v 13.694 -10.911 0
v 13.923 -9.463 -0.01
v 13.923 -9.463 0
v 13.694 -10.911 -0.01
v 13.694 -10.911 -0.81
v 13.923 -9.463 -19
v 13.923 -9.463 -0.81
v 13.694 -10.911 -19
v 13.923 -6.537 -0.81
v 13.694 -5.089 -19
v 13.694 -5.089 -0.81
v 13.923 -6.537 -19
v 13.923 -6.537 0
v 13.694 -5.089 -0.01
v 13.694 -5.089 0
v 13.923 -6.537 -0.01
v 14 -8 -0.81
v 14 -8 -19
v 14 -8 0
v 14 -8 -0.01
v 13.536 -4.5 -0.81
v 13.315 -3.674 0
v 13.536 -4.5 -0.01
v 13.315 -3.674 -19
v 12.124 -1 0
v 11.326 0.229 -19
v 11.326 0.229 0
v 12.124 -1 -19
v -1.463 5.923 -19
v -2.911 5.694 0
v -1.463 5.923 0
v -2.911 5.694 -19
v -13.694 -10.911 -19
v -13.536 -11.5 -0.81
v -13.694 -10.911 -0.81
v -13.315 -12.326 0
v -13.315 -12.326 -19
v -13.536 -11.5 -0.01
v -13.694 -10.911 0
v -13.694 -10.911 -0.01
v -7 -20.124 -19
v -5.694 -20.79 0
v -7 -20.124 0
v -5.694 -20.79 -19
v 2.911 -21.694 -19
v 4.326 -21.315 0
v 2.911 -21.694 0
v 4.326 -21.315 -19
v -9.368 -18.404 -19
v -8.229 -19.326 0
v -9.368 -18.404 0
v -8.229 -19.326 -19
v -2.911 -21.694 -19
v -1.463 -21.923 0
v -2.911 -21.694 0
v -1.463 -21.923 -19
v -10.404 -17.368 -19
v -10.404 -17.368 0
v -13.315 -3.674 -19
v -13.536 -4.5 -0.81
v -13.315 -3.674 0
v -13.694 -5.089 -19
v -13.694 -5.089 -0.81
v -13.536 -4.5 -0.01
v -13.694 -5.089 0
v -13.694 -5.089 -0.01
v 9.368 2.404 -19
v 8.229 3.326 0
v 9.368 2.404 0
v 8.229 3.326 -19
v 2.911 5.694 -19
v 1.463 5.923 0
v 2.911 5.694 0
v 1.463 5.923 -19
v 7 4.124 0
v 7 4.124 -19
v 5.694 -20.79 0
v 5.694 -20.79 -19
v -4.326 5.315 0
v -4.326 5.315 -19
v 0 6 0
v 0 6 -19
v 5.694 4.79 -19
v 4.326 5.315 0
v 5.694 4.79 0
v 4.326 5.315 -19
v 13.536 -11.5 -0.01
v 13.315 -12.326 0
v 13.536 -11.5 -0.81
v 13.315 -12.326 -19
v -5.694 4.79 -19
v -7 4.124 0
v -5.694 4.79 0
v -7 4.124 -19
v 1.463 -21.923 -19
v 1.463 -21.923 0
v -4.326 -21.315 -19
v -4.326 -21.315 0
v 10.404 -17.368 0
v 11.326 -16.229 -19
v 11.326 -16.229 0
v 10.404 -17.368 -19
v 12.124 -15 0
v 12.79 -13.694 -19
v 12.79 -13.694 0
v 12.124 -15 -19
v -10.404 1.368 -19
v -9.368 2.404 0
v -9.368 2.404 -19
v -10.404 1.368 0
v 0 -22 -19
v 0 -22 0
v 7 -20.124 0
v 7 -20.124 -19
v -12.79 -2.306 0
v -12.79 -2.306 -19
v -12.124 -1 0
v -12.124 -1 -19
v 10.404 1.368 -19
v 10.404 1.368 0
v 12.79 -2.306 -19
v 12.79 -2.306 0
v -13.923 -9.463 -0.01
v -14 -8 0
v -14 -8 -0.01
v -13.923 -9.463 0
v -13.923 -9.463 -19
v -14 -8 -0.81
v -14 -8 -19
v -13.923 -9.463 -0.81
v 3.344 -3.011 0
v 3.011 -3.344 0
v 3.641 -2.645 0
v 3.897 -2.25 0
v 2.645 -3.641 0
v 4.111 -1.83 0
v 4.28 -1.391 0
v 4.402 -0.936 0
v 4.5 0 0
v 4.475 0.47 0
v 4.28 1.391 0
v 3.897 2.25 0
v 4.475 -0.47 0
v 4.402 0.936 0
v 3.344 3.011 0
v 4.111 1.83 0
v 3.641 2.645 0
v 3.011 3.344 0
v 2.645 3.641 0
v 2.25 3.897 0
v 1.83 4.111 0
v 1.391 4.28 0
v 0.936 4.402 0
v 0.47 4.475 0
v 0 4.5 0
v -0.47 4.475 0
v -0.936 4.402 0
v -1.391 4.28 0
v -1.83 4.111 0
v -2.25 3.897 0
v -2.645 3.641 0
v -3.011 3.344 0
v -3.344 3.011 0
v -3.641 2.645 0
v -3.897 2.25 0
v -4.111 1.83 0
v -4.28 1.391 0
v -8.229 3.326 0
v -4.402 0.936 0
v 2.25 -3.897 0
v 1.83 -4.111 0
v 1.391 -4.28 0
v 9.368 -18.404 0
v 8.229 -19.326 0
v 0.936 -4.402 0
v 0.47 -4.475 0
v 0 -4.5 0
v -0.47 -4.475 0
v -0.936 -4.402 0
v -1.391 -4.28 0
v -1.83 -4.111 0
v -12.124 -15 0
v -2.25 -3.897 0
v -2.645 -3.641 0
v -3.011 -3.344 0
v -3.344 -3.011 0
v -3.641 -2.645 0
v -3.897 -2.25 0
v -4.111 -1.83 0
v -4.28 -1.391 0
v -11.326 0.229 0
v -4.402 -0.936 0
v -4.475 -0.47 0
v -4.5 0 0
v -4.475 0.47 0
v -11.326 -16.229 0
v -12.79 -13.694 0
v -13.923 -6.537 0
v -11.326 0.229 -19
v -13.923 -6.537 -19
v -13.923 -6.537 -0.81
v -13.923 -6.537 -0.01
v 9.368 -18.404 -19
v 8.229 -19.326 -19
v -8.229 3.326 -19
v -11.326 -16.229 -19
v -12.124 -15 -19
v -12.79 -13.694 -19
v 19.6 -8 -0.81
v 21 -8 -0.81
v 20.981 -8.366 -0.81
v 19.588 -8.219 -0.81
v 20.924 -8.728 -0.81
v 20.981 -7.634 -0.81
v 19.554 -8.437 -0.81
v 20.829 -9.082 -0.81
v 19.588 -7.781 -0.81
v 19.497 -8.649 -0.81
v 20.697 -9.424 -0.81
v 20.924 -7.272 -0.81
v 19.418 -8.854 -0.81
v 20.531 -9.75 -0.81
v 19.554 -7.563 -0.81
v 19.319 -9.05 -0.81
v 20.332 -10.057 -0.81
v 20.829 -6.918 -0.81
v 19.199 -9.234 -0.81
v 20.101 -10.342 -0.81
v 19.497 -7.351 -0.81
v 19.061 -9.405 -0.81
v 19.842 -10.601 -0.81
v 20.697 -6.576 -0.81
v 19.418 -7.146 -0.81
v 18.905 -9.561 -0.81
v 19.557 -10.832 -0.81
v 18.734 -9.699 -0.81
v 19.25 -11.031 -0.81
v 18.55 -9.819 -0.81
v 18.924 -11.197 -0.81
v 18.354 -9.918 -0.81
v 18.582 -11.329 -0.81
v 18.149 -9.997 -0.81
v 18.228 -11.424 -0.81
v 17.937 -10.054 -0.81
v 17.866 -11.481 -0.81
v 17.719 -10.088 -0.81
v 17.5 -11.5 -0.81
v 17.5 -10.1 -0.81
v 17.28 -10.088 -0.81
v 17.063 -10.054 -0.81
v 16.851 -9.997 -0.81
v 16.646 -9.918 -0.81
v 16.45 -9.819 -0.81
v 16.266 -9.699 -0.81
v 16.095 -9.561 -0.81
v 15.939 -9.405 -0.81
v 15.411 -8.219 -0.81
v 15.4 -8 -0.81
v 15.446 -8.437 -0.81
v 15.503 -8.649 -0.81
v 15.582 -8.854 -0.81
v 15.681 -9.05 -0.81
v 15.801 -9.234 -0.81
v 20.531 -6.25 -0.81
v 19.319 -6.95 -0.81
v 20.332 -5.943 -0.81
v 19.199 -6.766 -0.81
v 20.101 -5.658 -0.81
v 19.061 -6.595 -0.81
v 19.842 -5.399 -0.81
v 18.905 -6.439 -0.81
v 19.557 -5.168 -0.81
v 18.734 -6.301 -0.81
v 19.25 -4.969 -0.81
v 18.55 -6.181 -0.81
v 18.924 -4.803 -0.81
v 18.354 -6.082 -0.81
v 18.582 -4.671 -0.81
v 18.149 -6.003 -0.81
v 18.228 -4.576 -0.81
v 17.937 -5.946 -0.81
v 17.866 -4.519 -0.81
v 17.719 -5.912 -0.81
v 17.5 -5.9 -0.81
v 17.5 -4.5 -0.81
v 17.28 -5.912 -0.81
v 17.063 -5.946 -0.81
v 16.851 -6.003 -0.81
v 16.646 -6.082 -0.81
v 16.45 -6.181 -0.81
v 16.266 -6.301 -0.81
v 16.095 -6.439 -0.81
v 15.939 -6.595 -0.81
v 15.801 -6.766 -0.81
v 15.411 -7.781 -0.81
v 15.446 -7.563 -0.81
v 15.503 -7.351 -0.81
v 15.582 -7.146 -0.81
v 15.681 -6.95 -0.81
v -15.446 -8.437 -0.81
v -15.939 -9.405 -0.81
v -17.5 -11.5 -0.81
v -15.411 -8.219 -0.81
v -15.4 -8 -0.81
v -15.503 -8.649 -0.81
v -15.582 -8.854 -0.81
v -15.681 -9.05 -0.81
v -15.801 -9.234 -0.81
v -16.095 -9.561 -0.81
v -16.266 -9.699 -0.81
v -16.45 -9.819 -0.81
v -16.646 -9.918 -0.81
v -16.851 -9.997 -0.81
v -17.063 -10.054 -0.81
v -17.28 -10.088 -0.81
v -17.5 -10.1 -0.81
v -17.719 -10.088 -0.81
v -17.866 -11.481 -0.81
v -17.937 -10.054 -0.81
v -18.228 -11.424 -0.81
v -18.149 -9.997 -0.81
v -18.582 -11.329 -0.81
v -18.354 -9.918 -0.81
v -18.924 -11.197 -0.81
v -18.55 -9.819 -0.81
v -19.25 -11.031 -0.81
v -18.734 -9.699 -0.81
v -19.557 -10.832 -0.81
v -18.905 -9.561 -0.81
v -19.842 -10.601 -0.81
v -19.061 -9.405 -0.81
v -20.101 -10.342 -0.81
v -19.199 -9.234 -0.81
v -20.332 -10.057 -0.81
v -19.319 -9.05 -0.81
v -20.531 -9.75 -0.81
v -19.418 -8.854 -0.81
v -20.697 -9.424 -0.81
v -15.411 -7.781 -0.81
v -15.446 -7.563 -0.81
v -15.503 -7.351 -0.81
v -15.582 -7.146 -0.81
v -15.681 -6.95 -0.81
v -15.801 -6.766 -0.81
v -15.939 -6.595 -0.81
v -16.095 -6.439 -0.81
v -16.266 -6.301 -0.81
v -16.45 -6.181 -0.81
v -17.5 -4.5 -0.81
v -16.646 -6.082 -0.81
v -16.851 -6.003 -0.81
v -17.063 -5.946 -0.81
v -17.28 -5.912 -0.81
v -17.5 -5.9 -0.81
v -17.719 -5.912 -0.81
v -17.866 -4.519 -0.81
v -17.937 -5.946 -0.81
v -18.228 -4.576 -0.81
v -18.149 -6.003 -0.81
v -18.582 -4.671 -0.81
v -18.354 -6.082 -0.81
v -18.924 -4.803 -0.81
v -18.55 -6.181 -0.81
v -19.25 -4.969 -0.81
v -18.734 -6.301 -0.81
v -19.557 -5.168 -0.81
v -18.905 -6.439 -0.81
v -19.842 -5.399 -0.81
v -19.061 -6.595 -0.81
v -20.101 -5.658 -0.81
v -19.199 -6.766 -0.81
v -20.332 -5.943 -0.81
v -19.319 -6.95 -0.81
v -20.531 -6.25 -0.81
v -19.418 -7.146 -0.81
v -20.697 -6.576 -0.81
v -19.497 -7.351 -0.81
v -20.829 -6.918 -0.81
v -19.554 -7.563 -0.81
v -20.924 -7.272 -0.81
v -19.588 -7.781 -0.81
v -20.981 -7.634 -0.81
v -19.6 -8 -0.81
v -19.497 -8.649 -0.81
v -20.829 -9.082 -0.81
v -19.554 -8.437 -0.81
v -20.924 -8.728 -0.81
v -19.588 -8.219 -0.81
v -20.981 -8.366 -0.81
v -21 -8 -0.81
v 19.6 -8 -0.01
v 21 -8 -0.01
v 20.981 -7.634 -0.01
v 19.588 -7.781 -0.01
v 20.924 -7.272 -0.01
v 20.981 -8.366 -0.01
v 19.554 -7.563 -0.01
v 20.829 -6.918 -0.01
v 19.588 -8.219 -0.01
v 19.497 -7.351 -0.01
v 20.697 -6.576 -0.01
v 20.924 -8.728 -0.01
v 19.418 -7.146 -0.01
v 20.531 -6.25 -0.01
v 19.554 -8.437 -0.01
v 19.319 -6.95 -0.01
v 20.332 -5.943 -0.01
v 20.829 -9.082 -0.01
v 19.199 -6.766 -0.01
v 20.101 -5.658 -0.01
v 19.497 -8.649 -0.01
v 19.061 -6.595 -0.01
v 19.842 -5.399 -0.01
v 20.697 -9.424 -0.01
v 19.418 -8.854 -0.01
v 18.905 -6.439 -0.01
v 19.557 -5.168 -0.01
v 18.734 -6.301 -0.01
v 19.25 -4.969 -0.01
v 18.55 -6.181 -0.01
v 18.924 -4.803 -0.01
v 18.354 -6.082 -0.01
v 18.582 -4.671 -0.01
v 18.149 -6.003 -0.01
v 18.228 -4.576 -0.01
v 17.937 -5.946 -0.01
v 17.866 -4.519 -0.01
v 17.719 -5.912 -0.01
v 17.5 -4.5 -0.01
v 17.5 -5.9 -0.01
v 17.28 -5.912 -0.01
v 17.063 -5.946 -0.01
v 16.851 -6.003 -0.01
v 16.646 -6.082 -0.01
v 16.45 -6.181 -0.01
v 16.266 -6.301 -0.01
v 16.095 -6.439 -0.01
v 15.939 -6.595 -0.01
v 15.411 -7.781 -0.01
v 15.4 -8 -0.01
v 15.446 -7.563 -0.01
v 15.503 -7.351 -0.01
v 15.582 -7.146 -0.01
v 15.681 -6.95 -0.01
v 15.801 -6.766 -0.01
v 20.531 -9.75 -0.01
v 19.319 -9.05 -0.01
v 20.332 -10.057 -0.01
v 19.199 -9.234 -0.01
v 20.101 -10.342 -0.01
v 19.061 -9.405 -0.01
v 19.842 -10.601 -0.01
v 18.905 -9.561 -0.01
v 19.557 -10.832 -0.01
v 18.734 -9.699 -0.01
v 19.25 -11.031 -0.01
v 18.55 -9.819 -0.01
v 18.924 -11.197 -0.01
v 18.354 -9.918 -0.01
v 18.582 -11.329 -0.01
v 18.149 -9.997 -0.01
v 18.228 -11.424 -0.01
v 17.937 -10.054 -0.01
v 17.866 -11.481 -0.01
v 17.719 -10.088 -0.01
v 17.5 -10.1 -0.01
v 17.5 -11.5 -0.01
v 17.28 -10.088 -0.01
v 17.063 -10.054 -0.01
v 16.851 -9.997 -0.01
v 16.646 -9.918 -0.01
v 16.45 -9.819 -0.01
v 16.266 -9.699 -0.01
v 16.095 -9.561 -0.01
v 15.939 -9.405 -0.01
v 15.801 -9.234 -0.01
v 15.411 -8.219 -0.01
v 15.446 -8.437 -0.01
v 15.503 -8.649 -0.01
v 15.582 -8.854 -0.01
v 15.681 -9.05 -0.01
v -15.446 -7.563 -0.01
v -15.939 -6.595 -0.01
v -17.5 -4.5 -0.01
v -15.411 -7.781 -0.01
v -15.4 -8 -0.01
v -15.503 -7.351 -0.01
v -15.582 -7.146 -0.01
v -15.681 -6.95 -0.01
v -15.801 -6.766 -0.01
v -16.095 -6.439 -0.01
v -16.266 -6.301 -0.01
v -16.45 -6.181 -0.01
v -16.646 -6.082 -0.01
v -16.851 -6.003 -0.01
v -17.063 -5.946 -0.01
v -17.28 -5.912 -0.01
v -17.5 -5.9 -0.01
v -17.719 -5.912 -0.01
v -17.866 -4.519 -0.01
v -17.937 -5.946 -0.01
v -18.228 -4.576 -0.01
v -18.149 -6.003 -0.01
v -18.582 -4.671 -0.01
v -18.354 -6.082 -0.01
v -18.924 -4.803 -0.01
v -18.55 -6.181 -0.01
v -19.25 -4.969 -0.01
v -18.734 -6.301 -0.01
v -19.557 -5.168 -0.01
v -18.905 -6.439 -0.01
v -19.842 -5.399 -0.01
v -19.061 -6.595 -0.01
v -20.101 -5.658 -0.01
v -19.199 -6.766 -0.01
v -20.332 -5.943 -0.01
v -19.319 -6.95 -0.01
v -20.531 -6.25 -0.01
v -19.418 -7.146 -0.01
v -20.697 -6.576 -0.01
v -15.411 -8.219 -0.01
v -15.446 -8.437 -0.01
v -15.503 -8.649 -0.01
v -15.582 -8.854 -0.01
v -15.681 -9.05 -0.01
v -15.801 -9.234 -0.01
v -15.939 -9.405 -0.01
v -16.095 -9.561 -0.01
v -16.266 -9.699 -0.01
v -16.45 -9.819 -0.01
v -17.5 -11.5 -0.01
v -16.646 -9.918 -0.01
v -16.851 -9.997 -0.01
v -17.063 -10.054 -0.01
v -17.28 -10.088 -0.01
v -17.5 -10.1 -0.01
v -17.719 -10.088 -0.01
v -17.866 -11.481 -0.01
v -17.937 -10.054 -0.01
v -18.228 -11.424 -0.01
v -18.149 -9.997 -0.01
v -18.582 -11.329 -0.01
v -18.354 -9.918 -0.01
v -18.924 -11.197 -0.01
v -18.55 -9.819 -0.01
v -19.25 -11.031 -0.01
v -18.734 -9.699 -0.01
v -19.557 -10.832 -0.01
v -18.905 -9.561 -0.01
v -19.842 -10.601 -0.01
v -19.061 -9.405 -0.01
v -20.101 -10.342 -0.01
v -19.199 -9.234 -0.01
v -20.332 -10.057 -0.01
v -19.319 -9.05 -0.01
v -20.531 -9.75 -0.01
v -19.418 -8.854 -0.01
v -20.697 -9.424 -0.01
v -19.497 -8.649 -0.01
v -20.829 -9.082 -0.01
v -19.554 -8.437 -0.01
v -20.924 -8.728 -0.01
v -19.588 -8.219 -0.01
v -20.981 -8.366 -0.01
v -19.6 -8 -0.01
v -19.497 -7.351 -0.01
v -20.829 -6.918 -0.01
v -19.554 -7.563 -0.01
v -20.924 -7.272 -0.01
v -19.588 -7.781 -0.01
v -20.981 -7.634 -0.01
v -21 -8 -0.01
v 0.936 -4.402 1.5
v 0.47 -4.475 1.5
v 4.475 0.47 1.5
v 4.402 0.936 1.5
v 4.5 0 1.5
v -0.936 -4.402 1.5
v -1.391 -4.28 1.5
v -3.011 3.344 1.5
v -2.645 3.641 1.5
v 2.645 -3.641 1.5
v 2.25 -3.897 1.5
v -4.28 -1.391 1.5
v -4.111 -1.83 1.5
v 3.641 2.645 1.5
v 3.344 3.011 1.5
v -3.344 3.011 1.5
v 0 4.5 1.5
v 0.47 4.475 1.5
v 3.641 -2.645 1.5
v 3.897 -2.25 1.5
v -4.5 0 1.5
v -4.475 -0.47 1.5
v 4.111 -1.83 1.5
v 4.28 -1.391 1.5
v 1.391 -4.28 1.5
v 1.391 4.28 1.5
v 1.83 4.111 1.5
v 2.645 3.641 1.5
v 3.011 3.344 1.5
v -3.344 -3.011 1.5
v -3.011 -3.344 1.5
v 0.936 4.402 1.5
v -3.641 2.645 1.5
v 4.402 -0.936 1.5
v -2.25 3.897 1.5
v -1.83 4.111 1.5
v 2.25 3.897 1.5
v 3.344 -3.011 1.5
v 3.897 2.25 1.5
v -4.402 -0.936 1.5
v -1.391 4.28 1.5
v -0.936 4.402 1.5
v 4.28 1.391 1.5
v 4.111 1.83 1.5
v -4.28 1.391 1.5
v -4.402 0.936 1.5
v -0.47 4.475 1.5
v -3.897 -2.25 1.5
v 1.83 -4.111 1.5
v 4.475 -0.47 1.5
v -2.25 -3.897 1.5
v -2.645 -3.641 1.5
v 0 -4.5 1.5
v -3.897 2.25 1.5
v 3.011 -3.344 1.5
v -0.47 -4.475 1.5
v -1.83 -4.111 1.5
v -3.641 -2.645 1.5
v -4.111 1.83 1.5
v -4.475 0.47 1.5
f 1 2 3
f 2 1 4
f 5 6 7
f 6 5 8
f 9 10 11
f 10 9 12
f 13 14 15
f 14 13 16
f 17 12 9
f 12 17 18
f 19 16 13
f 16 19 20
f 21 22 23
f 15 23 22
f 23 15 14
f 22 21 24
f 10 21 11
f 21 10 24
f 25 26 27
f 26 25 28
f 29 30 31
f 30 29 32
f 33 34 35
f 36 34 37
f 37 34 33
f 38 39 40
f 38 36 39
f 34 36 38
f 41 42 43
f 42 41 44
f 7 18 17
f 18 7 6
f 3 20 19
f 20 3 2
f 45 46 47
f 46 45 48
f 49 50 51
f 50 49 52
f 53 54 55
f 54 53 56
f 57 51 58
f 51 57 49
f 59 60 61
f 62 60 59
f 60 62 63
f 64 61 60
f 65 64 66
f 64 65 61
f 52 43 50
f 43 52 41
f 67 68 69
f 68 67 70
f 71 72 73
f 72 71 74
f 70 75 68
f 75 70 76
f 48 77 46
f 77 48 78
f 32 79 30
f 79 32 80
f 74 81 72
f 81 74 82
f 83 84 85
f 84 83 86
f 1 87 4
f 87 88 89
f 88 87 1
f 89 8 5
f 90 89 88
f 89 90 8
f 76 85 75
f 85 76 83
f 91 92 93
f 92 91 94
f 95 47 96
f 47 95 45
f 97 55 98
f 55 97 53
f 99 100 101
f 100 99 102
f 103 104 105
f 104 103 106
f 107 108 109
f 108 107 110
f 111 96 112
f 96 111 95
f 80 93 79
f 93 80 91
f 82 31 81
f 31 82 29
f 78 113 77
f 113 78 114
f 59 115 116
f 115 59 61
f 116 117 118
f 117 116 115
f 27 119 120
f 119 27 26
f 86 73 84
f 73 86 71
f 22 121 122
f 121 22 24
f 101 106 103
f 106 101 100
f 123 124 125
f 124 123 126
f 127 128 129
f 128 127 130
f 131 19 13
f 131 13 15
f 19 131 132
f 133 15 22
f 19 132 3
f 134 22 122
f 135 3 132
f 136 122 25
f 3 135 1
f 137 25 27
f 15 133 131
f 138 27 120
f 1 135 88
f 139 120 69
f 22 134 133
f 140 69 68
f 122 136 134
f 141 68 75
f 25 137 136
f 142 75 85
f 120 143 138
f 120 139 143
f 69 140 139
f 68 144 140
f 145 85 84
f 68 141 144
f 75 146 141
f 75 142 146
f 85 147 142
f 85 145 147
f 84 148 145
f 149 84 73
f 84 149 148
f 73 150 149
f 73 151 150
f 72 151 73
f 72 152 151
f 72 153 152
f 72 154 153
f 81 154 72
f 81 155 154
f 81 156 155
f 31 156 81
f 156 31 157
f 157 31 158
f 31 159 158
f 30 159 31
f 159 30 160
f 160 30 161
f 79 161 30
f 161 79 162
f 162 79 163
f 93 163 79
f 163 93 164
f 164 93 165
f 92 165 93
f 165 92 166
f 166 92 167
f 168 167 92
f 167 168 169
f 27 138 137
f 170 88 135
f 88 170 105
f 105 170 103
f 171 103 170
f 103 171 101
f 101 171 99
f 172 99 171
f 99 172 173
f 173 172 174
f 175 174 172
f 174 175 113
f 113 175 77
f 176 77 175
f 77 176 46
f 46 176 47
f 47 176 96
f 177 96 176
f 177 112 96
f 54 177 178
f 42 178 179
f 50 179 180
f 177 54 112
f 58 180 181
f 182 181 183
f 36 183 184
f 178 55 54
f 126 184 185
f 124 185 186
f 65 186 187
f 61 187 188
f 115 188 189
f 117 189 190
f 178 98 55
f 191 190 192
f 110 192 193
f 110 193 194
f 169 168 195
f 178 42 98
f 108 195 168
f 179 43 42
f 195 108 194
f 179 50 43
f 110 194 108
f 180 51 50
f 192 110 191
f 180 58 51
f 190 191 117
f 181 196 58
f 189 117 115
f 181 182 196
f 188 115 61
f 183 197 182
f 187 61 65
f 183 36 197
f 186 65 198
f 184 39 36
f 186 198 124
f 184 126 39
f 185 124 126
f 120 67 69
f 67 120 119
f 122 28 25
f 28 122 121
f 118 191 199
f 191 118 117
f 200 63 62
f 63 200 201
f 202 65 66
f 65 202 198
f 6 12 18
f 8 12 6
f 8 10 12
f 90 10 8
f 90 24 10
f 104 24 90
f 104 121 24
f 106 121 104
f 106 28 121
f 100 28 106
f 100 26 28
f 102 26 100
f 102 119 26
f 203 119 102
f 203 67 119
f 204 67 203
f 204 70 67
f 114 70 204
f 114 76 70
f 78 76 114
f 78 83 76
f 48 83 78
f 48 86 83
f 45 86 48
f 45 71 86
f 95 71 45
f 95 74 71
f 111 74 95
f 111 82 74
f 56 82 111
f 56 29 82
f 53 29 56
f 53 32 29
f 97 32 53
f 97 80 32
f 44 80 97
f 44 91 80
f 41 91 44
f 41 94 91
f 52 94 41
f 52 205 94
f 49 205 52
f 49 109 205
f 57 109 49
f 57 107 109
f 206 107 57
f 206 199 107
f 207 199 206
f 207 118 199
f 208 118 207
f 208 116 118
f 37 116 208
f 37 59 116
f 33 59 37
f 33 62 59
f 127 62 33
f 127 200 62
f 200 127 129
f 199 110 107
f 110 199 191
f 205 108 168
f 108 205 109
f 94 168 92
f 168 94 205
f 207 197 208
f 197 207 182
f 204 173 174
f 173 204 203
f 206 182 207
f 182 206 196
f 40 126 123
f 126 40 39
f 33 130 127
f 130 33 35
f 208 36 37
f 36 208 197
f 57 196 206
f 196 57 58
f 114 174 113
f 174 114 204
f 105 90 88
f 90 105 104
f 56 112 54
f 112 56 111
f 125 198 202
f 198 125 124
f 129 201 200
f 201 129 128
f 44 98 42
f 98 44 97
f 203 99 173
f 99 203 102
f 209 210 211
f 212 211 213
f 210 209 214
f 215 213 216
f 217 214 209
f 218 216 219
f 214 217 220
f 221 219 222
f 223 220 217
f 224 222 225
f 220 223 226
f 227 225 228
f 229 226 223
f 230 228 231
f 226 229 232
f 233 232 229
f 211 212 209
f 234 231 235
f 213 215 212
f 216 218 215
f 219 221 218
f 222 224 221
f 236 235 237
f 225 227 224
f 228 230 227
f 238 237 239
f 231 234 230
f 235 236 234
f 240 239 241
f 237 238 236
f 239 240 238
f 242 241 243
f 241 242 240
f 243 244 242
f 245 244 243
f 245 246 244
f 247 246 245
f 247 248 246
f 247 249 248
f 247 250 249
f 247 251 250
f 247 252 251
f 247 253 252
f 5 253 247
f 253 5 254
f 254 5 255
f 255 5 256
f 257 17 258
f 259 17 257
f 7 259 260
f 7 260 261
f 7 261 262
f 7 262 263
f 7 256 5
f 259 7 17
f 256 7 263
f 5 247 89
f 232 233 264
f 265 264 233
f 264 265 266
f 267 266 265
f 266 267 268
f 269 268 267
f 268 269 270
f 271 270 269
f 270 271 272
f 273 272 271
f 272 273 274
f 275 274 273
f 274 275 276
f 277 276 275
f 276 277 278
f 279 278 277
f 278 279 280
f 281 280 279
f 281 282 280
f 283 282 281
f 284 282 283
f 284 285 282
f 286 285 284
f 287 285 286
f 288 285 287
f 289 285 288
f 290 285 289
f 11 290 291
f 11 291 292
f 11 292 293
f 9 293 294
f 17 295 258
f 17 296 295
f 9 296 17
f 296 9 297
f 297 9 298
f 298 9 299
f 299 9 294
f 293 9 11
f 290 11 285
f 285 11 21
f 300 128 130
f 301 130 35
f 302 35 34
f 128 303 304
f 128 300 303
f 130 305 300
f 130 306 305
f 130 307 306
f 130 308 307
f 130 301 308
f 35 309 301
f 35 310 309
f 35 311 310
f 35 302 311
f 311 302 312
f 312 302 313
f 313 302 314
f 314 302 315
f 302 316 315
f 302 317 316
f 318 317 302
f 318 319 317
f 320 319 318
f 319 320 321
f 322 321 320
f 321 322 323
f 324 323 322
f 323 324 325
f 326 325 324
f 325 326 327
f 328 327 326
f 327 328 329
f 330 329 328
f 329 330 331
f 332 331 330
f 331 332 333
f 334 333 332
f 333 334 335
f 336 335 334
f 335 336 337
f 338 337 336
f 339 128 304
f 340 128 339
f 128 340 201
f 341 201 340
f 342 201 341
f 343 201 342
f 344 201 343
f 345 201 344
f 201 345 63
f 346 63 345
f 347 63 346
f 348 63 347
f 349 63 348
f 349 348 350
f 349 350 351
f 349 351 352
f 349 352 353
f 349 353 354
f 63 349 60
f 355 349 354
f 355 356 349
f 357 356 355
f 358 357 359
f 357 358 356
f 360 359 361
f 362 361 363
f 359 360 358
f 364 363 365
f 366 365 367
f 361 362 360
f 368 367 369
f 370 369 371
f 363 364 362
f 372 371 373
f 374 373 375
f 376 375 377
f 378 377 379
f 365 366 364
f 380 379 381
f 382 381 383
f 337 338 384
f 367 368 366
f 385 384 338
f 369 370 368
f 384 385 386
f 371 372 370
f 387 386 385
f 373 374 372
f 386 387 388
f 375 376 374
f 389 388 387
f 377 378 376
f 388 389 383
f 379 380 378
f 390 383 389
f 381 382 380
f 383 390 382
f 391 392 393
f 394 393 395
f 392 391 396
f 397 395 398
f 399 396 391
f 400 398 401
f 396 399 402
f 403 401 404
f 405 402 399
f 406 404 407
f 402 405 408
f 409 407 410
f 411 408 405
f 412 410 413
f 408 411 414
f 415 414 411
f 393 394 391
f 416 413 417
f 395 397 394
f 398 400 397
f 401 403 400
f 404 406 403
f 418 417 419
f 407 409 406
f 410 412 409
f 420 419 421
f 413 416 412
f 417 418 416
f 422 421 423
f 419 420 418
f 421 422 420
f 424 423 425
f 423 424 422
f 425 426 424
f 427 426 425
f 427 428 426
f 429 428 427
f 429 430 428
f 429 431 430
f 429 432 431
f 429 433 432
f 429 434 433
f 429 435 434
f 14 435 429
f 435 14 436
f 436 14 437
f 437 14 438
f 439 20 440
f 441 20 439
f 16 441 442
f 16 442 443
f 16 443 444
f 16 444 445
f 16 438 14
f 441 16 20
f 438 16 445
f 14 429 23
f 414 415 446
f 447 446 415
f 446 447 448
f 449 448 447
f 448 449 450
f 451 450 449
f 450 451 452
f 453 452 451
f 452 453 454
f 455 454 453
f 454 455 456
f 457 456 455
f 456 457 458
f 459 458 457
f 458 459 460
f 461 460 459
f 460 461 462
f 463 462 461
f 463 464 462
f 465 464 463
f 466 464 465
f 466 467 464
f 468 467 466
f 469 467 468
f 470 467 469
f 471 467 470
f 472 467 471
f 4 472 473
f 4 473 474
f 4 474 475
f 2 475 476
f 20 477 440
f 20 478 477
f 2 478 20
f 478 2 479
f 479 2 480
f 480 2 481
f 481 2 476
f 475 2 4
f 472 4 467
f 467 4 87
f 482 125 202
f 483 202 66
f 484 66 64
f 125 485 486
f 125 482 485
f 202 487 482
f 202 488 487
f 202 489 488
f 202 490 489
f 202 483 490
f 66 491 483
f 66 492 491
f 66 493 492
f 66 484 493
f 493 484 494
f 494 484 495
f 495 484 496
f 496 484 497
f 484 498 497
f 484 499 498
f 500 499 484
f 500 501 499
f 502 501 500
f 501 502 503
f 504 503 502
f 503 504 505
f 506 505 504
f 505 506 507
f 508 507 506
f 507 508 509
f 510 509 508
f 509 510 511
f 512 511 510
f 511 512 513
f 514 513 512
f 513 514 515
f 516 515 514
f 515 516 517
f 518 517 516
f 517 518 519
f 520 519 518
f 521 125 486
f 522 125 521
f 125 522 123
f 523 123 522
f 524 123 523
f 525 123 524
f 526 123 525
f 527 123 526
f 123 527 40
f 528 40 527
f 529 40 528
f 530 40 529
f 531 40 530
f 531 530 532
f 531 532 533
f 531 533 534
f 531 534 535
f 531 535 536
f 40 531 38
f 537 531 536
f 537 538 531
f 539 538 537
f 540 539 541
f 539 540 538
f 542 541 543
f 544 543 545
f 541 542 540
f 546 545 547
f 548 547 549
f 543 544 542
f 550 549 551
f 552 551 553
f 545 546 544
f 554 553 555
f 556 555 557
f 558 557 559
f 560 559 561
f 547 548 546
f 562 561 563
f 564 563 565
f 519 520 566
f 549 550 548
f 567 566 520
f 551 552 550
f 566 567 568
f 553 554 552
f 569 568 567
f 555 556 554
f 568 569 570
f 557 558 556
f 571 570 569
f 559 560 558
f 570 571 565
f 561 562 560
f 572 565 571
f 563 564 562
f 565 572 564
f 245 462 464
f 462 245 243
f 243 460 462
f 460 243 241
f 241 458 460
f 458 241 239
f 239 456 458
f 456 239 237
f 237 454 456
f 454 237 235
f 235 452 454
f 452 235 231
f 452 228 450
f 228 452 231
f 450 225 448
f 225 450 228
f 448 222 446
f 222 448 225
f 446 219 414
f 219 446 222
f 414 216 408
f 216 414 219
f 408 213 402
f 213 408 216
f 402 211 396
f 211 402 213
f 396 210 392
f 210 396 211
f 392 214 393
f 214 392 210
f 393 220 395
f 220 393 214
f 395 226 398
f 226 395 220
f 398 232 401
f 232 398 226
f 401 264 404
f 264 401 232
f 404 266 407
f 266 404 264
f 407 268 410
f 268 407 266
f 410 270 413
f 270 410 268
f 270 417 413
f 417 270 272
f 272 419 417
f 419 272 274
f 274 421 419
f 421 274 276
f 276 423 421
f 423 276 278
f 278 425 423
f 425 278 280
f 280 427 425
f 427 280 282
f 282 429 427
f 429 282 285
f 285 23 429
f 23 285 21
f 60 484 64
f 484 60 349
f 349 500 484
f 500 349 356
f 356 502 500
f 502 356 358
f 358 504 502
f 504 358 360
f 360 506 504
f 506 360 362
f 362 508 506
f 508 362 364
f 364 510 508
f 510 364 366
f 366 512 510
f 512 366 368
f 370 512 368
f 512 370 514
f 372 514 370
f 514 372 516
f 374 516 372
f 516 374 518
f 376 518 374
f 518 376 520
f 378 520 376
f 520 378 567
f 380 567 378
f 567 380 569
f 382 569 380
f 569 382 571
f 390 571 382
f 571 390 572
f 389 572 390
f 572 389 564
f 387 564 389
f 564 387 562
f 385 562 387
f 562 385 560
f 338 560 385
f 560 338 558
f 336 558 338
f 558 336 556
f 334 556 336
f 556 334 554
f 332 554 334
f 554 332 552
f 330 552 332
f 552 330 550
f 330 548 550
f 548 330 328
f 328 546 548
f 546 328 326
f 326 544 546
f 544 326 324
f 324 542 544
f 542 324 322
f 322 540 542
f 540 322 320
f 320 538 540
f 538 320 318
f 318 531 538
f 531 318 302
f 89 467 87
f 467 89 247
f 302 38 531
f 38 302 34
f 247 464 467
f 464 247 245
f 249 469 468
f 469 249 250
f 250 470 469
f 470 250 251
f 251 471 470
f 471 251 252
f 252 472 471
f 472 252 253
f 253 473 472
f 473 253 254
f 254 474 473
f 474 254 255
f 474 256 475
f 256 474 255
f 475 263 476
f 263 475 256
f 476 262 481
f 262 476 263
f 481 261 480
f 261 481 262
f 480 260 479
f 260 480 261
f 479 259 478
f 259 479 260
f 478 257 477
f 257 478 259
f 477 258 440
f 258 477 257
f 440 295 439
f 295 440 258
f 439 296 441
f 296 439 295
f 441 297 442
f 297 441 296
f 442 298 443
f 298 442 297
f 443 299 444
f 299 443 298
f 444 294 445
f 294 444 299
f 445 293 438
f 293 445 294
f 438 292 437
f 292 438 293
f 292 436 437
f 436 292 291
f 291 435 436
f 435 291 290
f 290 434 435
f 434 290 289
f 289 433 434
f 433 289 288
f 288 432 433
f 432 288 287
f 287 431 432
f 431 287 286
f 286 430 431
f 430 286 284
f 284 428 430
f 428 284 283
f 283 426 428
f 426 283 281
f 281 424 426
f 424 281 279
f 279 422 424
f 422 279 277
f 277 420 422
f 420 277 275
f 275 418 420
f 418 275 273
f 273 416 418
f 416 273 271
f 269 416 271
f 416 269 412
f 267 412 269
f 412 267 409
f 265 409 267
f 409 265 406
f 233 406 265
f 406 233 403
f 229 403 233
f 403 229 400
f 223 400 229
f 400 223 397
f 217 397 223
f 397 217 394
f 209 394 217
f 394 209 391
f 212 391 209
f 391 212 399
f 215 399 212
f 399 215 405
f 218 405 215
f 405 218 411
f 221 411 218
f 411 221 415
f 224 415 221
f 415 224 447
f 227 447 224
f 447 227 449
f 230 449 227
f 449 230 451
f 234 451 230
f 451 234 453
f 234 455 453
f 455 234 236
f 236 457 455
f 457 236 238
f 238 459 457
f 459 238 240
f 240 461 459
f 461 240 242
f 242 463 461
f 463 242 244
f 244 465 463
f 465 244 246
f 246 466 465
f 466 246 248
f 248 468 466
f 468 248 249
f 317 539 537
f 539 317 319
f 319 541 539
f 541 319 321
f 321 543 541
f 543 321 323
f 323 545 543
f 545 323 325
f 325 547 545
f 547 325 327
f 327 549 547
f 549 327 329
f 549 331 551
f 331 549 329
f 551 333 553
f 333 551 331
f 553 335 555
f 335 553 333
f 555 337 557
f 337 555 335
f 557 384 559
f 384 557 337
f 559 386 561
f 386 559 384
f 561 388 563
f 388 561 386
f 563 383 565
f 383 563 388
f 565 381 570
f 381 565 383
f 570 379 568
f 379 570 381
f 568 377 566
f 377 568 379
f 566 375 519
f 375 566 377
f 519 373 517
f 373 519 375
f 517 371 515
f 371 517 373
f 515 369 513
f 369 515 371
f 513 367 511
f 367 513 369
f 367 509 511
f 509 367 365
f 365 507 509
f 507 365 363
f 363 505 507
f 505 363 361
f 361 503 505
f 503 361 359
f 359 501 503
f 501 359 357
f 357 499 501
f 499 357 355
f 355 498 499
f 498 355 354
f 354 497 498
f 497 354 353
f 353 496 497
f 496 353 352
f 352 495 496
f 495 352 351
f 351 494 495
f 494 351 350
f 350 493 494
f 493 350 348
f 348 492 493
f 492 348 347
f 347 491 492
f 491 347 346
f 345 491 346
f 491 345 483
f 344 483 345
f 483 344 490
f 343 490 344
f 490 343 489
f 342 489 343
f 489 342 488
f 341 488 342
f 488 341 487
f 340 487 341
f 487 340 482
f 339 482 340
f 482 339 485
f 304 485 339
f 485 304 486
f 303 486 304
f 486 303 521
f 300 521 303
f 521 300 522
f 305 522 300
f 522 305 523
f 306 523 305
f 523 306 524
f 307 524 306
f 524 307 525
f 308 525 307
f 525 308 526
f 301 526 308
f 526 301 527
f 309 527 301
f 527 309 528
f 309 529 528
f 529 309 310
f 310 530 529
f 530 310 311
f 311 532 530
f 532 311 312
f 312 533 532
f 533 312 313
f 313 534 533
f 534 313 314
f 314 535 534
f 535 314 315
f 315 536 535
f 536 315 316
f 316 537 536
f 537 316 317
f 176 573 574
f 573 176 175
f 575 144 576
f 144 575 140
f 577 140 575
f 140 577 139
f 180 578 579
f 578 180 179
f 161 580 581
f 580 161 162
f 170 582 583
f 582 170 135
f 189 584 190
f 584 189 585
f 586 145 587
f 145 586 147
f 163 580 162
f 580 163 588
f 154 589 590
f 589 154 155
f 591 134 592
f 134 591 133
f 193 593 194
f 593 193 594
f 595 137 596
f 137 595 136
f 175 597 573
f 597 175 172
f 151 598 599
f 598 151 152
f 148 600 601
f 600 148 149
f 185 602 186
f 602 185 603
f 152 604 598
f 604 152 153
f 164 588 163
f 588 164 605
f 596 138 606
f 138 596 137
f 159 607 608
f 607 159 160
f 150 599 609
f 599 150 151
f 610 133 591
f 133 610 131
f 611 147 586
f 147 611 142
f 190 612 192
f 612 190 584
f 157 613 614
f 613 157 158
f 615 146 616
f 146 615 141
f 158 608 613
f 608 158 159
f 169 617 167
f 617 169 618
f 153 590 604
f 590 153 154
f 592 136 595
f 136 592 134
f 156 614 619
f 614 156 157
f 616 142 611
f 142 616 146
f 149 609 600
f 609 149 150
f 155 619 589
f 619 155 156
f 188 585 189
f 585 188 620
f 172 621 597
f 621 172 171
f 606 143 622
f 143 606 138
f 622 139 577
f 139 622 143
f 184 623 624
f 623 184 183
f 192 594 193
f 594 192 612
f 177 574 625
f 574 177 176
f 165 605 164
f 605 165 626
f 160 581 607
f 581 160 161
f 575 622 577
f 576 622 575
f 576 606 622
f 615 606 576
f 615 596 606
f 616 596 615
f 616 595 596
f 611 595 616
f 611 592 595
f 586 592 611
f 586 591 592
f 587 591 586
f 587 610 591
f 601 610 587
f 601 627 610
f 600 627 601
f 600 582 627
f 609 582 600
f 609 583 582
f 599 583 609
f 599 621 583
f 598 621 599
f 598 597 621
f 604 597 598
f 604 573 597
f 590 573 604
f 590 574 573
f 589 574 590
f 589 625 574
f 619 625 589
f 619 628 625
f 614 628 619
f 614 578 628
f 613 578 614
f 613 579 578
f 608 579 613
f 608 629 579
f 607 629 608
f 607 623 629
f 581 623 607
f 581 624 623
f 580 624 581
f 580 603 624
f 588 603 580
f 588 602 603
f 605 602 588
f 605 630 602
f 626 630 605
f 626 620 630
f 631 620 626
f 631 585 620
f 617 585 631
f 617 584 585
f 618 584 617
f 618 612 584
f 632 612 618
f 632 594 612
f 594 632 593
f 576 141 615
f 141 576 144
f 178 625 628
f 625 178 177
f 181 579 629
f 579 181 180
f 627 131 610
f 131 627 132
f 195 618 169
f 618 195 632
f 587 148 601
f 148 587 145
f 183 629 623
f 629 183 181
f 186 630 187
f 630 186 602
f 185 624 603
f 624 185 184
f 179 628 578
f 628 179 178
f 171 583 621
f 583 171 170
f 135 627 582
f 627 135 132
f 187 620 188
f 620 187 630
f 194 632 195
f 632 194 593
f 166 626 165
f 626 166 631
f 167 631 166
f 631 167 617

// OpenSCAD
/*
   Copyright 2015-2018 Scott Bezek and the splitflap contributors

   Licensed under the Apache License, Version 2.0 (the "License");
   you may not use this file except in compliance with the License.
   You may obtain a copy of the License at

       http://www.apache.org/licenses/LICENSE-2.0

   Unless required by applicable law or agreed to in writing, software
   distributed under the License is distributed on an "AS IS" BASIS,
   WITHOUT WARRANTIES OR CONDITIONS OF ANY KIND, either express or implied.
   See the License for the specific language governing permissions and
   limitations under the License.
*/

28byj48_chassis_radius = 28/2;
28byj48_chassis_height = 19;
28byj48_shaft_offset = 8;
28byj48_mount_outer_radius = 3.5;
28byj48_mount_hole_radius = 4.2/2;
28byj48_mount_center_offset = 35/2;
28byj48_mount_bracket_height = 0.8;

28byj48_shaft_collar_radius = 9/2;
28byj48_shaft_collar_height = 1.5;

28byj48_shaft_radius = 5/2;
28byj48_shaft_height = 10;
28byj48_shaft_slotted_width = 3;
28byj48_shaft_slotted_height = 6;

28byj48_backpack_width = 14.6;
28byj48_backpack_extent = 18; // seen values from 17-18
28byj48_backpack_height = 16;

// Exports for use in other files:
function 28byj48_mount_bracket_height() = 28byj48_mount_bracket_height;
function 28byj48_shaft_radius() = 28byj48_shaft_radius;
function 28byj48_mount_center_offset() = 28byj48_mount_center_offset;
function 28byj48_chassis_radius() = 28byj48_chassis_radius;
function 28byj48_shaft_offset() = 28byj48_shaft_offset;
function 28byj48_chassis_height() = 28byj48_chassis_height;
function 28byj48_backpack_extent() = 28byj48_backpack_extent;

// Basic 28BYJ-48 model based on various dimensioned drawings.
// Origin is centered on the shaft, on the front face of the motor, with the shaft in the +z direction
module Stepper28BYJ48() {
    $fn = 60;

    eps = 0.01;

    gray = [0.7, 0.7, 0.7];
    gold = [1, 0.843, 0];
    blue = [0, 0, 1];

    module mounting_holes() {
        linear_extrude(height=28byj48_mount_bracket_height) {
        difference() {
            hull() {
                translate([28byj48_mount_center_offset, 0]) {
                    circle(r=28byj48_mount_outer_radius);
                }
                translate([-28byj48_mount_center_offset, 0]) {
                    circle(r=28byj48_mount_outer_radius);
                }
            }

            translate([28byj48_mount_center_offset, 0]) {
                circle(r=28byj48_mount_hole_radius);
            }
            translate([-28byj48_mount_center_offset, 0]) {
                circle(r=28byj48_mount_hole_radius);
            }
        }
        }
    }

    module shaft_collar() {
        cylinder(r=28byj48_shaft_collar_radius, h=28byj48_shaft_collar_height + eps);
    }

    module shaft() {
         color_selector(gold) {
            difference() {
                cylinder(r=28byj48_shaft_radius, h=28byj48_shaft_height);
                translate([-(28byj48_shaft_radius + eps), 28byj48_shaft_slotted_width / 2, 28byj48_shaft_height - 28byj48_shaft_slotted_height]) {
                    cube([(28byj48_shaft_radius+eps)*2, 28byj48_shaft_radius, 28byj48_shaft_slotted_height+eps]);
                }
                translate([-(28byj48_shaft_radius + eps), - 28byj48_shaft_radius - (28byj48_shaft_slotted_width / 2), 28byj48_shaft_height - 28byj48_shaft_slotted_height]) {
                    cube([(28byj48_shaft_radius+eps)*2, 28byj48_shaft_radius, 28byj48_shaft_slotted_height+eps]);
                }
            }
        }
    }

    module chassis() {
         color_selector(gray) {
            translate([0, 0, -28byj48_chassis_height]) {
                cylinder(r=28byj48_chassis_radius, h=28byj48_chassis_height);
            }
            translate([0, 0, -28byj48_mount_bracket_height - eps]) {
                mounting_holes();
            }
            translate([0, 28byj48_shaft_offset, -eps]) {
                shaft_collar();
            }
        }
    }

    module backpack() {
         color_selector(blue) {
            translate([-28byj48_backpack_width/2, 0, -28byj48_backpack_height - eps]) {
                cube([28byj48_backpack_width, 28byj48_backpack_extent, 28byj48_backpack_height]);
            }
        }
    }

    translate([0, -28byj48_shaft_offset, 0]) {
        chassis();
        translate([0, 28byj48_shaft_offset, 0]) {
            shaft();
        }
        translate([0, -28byj48_backpack_extent, 0]) {
            backpack();
        }
    }
}

// Example usage:
Stepper28BYJ48();

        module color_selector(c) {
            precision = 0.0000001;  // arbitrary
            function compare_floats(x, y, i=0) = 
                  (len(x) != len(y)) ? false  // if arrays differ in length, they can't be equal
                : (i >= len(x)) ? true  // if we've hit the end of the arrays without issue, we're equal
                : (x[i] - precision <= y[i]) && x[i] + precision >= y[i]
                    ? compare_floats(x, y, i+1)
                    : false;  // not equal, short circuit

            if (c == [0.7, 0.7, 0.7] || compare_floats(c, [0.7, 0.7, 0.7]))
                children();
        }
                    
